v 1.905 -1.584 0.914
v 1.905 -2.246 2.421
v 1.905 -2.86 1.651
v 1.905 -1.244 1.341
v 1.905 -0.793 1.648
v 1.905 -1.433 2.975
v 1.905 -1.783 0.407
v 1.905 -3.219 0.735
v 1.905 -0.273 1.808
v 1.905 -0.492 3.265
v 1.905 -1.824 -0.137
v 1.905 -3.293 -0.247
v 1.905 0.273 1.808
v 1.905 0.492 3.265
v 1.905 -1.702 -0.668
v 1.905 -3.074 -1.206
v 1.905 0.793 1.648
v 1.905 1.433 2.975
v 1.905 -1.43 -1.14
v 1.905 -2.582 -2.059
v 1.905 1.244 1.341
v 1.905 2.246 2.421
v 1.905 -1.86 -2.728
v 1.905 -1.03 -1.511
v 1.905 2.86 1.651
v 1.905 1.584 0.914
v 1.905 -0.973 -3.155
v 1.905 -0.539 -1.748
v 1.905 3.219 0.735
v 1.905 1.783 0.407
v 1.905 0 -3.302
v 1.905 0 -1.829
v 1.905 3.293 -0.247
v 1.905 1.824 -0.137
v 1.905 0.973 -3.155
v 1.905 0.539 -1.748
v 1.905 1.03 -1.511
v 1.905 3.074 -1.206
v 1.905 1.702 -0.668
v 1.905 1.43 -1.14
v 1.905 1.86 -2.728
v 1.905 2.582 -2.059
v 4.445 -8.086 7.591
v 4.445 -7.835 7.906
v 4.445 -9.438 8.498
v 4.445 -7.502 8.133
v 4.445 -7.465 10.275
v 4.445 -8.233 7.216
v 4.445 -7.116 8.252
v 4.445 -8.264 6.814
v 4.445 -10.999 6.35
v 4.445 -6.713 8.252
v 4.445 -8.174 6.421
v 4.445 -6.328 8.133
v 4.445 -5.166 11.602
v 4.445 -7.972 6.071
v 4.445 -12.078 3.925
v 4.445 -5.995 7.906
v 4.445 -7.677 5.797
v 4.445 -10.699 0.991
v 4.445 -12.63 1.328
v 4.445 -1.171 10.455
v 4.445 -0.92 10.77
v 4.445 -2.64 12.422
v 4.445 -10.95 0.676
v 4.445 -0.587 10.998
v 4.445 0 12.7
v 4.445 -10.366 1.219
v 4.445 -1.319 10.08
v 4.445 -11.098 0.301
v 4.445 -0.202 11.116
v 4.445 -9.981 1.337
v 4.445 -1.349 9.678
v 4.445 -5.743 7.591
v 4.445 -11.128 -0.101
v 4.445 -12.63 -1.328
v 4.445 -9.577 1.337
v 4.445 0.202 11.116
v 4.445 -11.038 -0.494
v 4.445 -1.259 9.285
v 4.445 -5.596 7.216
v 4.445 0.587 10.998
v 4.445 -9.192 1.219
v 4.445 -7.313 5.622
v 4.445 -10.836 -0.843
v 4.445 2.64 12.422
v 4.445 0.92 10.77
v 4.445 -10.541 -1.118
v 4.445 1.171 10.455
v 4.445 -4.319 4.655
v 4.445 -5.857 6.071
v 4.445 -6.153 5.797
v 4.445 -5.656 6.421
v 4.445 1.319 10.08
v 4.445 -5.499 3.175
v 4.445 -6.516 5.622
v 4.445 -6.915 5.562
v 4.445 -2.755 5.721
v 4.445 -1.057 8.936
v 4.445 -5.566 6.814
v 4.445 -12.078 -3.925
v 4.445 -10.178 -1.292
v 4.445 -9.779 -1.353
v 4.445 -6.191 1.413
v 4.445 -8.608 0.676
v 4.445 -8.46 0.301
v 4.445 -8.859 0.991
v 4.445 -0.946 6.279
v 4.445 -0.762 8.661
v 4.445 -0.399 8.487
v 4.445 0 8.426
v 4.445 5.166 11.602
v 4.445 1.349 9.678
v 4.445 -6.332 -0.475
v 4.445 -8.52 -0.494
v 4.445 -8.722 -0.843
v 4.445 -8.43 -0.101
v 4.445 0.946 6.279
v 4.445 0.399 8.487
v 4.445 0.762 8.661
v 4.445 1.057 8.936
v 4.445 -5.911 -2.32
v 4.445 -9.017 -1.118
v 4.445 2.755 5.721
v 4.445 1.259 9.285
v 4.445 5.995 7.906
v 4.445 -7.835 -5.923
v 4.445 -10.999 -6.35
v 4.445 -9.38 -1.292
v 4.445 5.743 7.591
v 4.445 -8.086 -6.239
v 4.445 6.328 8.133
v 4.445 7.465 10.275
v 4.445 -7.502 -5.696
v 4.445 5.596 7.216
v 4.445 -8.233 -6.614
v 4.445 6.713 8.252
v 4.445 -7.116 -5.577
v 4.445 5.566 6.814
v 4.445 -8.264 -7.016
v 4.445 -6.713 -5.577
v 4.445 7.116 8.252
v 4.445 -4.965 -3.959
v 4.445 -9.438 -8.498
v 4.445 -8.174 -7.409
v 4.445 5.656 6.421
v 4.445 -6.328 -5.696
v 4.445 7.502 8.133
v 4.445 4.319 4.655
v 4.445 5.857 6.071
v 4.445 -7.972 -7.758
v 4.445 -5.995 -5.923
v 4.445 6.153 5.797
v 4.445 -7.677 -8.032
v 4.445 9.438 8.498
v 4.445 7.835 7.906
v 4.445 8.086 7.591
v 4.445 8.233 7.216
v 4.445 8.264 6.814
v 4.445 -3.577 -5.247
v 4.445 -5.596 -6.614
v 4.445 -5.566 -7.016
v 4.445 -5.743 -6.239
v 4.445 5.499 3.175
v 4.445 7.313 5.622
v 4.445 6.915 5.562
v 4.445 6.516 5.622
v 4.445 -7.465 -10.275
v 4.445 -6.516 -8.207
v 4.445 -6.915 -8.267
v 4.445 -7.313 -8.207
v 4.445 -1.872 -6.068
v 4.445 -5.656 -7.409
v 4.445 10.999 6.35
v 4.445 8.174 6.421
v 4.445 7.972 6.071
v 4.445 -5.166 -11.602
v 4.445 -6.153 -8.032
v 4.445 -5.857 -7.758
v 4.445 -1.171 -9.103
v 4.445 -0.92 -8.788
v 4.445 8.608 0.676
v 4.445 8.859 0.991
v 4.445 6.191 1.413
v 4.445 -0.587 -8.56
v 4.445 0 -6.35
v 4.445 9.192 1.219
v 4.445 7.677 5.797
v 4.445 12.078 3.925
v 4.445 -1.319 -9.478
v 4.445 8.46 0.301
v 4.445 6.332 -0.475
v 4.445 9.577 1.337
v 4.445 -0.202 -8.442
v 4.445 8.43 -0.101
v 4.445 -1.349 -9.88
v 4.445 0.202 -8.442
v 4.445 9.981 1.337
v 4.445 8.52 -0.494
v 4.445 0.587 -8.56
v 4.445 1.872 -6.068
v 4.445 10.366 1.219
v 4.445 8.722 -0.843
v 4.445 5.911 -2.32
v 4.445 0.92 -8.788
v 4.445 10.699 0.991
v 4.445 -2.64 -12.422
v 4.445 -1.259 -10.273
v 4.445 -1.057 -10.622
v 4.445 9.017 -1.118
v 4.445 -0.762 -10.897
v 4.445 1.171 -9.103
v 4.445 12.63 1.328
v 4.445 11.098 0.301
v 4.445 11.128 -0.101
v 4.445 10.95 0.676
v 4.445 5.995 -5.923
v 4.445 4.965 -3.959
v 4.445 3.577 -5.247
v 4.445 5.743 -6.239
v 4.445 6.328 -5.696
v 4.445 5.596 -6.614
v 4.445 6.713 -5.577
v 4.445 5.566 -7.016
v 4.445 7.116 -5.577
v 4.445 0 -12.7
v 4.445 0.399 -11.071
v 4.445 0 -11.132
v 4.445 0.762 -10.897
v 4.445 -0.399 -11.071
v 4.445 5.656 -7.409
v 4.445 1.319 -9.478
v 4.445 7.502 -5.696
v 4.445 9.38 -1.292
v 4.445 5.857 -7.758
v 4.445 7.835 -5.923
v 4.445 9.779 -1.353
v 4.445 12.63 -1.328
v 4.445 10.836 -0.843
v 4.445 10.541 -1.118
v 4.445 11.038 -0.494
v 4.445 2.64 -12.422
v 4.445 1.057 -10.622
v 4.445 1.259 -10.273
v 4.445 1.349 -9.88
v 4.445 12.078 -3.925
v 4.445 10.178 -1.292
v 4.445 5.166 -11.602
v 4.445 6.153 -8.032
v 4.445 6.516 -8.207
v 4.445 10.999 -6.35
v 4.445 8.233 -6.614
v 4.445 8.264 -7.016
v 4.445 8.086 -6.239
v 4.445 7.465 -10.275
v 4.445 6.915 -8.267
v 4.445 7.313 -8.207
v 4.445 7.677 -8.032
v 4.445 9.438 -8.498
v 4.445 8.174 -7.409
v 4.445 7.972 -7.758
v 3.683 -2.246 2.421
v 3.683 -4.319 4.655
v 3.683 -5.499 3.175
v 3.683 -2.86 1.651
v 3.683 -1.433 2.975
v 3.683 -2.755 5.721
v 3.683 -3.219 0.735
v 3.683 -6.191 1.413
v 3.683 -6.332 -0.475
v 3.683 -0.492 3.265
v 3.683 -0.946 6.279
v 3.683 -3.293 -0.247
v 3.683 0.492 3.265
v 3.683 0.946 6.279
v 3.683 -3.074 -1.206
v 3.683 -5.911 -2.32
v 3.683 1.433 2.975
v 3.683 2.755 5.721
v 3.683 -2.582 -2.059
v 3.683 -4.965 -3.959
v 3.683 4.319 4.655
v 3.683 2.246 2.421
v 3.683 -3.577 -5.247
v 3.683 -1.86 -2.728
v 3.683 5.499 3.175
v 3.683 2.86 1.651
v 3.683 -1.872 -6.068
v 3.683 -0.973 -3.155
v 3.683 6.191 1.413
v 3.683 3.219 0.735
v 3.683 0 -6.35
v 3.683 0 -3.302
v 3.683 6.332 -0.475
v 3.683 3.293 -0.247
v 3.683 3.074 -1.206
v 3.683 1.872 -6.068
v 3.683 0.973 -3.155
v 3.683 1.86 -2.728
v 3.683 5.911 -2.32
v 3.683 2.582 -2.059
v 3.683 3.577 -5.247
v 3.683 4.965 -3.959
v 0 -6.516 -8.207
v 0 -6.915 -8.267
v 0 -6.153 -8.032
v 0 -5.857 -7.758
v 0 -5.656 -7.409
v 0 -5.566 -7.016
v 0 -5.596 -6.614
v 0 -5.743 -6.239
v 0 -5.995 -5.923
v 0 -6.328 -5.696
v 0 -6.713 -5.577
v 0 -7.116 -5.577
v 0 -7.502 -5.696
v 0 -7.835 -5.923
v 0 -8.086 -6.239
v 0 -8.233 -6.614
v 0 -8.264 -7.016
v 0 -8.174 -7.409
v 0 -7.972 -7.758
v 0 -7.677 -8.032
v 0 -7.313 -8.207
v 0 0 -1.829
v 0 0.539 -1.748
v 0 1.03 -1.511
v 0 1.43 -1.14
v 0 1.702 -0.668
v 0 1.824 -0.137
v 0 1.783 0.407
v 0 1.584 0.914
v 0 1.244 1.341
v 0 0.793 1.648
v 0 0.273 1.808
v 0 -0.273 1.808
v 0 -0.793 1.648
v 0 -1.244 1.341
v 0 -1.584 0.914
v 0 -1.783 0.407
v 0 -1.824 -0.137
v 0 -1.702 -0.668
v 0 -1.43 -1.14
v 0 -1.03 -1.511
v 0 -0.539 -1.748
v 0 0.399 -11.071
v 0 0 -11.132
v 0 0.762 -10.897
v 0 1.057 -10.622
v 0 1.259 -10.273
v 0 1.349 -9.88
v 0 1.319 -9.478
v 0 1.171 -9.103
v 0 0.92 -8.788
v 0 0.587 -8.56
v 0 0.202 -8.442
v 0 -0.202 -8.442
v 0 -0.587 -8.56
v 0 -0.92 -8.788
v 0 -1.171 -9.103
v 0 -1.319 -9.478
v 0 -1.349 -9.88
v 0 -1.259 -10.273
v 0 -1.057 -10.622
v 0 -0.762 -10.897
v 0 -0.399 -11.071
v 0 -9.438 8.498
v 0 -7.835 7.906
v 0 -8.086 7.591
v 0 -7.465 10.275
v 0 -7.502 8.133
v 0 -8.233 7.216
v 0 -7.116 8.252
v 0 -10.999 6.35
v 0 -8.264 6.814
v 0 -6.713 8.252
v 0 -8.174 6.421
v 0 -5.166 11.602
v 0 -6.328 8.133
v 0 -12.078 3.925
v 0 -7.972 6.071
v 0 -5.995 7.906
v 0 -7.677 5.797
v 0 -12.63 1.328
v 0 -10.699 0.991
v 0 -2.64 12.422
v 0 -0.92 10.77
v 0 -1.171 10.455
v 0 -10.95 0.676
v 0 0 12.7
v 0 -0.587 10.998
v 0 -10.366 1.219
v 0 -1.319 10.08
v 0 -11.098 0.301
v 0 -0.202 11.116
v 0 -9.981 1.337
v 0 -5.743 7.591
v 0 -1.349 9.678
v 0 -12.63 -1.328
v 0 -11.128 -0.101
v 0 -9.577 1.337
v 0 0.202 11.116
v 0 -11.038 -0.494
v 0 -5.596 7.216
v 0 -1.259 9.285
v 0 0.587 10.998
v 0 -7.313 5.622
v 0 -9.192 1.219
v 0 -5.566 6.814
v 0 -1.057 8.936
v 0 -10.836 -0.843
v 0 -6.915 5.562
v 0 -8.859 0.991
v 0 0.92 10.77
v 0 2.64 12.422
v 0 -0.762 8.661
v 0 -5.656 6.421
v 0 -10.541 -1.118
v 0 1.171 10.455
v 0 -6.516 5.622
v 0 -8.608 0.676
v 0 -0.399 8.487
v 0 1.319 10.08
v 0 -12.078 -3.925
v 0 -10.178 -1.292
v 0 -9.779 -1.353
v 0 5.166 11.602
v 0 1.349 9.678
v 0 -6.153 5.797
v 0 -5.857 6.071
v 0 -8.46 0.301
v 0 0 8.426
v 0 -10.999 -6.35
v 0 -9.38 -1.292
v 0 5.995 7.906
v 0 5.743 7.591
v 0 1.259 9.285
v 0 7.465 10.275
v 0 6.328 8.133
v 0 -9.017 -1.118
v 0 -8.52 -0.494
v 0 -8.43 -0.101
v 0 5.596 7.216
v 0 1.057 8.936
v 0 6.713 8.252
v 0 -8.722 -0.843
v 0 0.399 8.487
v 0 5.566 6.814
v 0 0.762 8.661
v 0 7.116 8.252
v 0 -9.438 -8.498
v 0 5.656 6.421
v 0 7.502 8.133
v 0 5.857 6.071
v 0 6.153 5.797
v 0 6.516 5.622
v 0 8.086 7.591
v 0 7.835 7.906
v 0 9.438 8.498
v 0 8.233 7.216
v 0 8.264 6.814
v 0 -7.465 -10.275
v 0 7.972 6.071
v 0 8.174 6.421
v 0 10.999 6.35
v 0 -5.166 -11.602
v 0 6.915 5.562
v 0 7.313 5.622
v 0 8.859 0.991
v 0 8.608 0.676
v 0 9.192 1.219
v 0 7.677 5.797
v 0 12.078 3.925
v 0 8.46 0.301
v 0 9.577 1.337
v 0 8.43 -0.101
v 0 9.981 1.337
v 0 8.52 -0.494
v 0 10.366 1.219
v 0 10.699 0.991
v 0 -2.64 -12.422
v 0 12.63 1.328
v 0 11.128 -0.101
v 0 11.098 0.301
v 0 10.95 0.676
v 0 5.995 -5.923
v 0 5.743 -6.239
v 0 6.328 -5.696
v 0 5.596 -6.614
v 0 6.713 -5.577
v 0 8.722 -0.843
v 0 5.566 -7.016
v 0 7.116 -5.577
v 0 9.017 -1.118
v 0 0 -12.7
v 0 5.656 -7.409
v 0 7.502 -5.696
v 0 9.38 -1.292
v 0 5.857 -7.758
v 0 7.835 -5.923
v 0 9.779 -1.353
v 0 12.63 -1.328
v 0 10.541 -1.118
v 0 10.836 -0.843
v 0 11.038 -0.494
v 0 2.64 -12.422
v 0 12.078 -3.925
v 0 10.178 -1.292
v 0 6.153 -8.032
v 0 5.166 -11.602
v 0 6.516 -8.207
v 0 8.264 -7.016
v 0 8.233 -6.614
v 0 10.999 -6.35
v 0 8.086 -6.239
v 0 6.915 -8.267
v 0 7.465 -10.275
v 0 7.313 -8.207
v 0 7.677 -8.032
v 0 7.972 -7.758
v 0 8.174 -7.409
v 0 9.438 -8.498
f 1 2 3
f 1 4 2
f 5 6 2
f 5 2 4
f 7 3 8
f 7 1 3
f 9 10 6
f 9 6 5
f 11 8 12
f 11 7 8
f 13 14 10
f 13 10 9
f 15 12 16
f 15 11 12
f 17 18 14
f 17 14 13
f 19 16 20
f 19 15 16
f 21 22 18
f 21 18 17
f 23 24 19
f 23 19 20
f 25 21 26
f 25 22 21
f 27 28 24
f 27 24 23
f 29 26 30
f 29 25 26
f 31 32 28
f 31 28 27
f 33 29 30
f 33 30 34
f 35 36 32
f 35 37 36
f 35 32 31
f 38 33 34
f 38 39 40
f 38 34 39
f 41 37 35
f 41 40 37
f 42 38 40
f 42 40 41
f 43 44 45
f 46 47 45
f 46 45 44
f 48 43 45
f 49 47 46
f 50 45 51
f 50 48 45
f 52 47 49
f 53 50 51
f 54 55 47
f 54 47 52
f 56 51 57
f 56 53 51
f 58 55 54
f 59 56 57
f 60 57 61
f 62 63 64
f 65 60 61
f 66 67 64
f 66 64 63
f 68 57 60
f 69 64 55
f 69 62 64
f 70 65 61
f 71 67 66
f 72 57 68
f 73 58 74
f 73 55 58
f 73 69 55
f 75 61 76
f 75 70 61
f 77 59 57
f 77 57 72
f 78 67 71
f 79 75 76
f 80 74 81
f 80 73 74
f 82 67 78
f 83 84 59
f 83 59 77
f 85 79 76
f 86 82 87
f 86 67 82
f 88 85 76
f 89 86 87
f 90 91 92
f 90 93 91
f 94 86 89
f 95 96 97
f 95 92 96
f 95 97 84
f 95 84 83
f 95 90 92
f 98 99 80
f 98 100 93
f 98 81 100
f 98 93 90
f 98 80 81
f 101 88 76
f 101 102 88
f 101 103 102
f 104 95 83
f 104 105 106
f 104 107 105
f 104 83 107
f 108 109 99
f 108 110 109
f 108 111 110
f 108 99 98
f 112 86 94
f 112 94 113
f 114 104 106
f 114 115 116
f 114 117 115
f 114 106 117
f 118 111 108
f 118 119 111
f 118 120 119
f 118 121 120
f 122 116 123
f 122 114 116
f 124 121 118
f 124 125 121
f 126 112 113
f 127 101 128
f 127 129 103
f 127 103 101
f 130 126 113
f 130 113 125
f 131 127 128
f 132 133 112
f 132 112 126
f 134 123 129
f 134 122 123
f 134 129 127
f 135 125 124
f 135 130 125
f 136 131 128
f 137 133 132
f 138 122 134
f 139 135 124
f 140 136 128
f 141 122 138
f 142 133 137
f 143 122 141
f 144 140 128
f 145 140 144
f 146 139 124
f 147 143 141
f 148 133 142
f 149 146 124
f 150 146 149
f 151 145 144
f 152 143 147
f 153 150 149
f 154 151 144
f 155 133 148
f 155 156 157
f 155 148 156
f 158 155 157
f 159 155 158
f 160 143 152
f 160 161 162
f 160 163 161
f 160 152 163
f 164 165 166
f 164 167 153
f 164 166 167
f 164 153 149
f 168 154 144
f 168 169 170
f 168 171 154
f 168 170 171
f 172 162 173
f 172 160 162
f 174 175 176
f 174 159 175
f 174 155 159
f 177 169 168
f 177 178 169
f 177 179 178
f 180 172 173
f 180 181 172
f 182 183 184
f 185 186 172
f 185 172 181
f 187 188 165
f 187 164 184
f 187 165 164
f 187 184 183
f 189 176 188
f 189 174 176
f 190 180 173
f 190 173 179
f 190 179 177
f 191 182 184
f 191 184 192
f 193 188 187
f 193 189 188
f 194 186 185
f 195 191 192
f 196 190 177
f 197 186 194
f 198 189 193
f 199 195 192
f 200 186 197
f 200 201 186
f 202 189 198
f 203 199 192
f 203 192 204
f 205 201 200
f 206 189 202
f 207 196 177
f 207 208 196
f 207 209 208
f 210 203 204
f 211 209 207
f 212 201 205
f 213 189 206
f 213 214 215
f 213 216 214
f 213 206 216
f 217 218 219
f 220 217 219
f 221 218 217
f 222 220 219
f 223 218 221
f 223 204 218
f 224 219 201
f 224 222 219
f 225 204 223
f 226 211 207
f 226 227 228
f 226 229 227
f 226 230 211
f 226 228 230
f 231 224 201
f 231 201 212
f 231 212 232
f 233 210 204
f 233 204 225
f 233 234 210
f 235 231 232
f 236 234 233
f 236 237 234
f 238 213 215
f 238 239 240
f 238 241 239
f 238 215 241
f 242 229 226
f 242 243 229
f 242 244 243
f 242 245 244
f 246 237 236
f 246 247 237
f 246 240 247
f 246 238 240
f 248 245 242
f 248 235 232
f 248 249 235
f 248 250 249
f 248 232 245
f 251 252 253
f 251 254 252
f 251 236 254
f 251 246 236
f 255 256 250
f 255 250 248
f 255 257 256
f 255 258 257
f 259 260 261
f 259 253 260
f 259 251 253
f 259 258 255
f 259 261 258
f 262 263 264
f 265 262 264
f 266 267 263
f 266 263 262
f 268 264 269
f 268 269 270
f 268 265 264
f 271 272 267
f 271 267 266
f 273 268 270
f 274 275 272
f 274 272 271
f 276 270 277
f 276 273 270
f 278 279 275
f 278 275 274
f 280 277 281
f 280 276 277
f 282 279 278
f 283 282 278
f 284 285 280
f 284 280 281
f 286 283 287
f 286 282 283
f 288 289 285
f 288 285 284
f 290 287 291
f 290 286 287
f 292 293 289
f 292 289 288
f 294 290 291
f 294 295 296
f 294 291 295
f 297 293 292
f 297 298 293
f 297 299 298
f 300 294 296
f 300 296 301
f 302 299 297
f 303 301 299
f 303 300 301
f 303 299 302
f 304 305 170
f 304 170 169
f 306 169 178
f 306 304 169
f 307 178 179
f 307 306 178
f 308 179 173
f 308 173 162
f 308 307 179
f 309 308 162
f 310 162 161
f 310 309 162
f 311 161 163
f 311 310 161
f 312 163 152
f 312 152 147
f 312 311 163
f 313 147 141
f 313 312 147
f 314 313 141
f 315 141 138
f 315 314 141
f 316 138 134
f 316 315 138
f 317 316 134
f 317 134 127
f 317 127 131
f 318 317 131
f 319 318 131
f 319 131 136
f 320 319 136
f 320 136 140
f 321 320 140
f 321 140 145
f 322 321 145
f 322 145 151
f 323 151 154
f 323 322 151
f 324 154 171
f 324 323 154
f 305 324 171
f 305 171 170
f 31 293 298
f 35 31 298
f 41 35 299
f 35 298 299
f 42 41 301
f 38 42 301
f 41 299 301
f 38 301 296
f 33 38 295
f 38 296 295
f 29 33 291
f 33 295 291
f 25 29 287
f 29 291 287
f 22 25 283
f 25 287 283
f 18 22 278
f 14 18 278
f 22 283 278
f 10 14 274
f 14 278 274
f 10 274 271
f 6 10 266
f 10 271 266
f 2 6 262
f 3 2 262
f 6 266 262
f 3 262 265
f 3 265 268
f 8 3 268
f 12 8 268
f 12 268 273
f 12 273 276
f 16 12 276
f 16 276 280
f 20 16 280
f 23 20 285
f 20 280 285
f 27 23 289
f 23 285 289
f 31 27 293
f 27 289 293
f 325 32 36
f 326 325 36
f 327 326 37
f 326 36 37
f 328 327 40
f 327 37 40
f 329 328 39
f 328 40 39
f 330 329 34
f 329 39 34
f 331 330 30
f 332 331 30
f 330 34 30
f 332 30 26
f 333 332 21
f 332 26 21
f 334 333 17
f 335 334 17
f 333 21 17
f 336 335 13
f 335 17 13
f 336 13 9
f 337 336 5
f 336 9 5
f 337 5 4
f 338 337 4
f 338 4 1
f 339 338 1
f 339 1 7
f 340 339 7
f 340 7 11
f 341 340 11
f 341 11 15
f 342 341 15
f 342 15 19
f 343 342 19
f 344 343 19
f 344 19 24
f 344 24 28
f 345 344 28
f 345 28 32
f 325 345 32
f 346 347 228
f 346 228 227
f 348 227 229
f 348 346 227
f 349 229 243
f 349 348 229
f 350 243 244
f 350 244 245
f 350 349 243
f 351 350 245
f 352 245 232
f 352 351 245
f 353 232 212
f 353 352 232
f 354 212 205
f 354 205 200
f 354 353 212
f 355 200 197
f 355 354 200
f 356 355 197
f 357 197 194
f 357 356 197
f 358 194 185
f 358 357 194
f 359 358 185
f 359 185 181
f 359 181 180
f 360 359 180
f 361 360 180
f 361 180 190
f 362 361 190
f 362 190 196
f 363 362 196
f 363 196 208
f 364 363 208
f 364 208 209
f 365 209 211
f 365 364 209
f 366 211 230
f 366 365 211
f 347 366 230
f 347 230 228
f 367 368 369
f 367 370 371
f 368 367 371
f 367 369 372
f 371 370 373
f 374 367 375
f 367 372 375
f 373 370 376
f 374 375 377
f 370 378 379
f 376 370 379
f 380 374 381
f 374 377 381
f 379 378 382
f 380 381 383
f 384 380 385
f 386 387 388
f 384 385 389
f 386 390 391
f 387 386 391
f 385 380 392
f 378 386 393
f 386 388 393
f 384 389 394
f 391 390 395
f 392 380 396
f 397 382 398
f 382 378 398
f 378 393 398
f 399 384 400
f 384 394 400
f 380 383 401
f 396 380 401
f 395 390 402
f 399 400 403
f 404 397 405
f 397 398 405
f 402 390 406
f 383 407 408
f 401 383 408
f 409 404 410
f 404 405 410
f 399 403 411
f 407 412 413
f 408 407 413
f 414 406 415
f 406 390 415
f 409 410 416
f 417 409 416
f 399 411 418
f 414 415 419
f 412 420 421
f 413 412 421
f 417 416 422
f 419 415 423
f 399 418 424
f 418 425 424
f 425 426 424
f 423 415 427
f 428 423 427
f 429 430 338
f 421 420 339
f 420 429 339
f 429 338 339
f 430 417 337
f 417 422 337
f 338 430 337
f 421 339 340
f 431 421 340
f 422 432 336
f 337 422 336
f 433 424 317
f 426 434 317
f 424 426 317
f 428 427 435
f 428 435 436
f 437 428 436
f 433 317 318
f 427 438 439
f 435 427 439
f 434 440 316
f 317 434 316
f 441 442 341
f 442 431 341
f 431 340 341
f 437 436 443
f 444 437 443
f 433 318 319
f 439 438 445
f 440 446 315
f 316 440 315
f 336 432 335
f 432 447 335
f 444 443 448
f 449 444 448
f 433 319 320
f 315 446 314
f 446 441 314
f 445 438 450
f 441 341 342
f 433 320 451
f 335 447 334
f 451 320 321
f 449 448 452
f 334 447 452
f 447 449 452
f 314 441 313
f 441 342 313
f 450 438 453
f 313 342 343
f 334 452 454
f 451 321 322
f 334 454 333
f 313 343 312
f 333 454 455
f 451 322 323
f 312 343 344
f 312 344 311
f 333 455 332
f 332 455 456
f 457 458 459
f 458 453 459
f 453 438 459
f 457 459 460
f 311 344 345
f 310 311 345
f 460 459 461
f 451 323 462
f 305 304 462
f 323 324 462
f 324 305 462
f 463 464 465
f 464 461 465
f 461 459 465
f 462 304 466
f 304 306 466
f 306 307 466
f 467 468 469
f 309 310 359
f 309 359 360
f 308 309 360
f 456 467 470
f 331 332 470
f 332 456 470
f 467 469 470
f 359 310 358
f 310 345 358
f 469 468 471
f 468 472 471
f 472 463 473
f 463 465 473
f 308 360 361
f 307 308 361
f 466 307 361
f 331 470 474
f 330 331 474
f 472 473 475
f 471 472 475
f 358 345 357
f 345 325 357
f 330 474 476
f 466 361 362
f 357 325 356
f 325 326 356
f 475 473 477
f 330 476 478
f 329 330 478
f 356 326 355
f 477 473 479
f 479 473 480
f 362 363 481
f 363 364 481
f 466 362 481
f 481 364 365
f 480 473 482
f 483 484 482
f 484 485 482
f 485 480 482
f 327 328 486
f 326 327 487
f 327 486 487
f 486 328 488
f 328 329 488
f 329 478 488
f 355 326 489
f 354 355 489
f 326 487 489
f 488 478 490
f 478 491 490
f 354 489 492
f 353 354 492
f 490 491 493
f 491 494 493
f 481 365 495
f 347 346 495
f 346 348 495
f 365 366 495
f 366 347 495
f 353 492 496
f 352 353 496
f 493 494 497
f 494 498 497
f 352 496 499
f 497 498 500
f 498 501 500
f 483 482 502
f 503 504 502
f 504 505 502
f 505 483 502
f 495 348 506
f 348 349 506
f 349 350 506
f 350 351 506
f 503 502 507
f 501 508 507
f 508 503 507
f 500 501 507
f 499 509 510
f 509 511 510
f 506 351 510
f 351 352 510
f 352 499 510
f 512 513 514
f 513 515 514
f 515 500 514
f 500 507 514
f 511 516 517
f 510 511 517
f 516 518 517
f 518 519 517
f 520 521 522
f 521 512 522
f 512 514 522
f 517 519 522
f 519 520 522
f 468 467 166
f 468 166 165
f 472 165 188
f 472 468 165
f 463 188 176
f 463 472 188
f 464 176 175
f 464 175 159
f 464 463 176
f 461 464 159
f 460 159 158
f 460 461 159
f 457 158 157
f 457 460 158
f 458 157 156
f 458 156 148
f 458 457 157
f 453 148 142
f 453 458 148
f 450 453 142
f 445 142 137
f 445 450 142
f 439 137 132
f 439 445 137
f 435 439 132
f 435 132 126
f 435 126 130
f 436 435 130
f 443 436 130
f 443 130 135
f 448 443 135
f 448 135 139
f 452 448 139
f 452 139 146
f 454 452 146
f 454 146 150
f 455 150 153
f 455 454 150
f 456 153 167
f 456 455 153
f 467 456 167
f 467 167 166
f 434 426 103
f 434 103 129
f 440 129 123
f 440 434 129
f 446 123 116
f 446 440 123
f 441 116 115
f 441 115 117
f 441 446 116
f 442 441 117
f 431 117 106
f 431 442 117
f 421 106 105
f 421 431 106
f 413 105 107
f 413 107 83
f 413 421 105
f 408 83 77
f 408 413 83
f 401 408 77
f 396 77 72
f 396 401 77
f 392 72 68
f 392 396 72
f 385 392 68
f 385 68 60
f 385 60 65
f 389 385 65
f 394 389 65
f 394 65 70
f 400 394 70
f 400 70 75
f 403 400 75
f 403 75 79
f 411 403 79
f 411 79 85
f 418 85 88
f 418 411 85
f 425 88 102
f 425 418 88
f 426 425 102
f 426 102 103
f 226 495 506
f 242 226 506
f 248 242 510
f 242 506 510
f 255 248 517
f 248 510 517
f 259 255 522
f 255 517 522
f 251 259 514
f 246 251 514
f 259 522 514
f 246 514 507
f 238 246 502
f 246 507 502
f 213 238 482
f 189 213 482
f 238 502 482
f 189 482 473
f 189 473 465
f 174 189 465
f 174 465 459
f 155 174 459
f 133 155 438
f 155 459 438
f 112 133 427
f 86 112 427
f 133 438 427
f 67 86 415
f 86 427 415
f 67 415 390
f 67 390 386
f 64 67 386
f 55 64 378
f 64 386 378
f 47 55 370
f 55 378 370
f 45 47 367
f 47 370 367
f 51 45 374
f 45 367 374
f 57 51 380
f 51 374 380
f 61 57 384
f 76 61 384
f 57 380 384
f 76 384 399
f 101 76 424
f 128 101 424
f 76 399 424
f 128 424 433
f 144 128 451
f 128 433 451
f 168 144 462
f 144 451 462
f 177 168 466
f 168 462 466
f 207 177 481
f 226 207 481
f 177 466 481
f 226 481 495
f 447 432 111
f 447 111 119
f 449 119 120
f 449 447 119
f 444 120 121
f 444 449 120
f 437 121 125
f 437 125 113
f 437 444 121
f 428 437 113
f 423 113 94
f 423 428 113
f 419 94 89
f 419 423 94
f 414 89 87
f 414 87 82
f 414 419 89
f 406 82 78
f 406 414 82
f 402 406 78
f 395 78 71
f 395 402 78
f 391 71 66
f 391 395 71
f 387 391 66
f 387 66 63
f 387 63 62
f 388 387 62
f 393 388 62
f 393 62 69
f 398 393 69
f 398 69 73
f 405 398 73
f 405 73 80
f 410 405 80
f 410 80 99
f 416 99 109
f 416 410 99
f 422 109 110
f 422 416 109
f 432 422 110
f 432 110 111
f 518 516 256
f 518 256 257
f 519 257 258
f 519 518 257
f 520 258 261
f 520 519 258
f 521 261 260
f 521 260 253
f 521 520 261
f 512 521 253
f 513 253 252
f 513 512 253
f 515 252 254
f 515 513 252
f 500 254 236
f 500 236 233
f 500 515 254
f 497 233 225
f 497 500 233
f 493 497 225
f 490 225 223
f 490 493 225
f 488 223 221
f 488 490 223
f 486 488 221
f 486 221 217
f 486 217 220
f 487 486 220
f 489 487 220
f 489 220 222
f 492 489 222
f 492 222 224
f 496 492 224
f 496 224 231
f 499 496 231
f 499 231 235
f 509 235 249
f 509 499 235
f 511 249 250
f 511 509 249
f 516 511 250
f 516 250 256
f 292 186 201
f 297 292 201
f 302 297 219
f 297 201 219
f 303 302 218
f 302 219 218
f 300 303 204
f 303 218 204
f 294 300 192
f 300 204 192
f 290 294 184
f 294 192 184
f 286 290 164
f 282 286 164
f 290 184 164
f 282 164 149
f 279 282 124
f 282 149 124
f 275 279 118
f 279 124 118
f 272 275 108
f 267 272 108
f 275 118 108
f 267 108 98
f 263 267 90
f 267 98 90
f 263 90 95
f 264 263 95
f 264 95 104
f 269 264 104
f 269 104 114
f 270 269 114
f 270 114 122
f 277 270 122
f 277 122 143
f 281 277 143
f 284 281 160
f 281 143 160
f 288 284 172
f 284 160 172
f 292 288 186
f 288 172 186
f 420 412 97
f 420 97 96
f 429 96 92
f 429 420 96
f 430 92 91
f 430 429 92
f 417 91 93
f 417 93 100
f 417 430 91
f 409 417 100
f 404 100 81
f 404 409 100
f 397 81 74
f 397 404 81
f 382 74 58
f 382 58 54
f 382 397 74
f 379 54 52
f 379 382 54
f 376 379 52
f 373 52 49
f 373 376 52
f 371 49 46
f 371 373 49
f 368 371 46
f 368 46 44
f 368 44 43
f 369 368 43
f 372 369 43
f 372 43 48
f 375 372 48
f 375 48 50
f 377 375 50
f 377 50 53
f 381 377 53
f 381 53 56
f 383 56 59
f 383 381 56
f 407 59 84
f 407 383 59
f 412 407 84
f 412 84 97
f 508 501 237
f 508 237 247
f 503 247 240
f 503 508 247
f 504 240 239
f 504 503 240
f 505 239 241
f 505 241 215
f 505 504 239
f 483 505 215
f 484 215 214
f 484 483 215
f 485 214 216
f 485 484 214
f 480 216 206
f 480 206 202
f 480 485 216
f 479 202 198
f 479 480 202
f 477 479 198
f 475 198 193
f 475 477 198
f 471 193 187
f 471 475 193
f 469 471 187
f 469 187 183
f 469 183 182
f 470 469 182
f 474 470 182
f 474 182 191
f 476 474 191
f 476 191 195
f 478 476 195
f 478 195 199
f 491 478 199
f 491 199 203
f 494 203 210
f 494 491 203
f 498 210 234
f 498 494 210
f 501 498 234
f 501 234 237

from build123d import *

# Parameters (mm, degrees)
SKETCH1_R           = 12.7
SKETCH1_R_2         = 1.35255
BOSS_EXTRUDE1_DEPTH = 4.445
SKETCH2_R           = 6.35
CUT_EXTRUDE1_DEPTH  = 0.762
SKETCH3_R           = 3.302
CUT_EXTRUDE2_DEPTH  = 1.778
SKETCH4_R           = 1.8288
CUT_EXTRUDE3_DEPTH  = 2.905


with BuildPart() as part:
    # Sketch1 → Boss-Extrude1 (new body)
    with BuildSketch(Plane(origin=(0, 0, 0), x_dir=(0, 0, -1), z_dir=(1, 0, 0))):
        Circle(SKETCH1_R)
        with Locations((0, 9.779)):
            Circle(SKETCH1_R_2, mode=Mode.SUBTRACT)
        with Locations((6.914797213, 6.914797213)):
            Circle(SKETCH1_R_2, mode=Mode.SUBTRACT)
        with Locations((9.779, 0)):
            Circle(SKETCH1_R_2, mode=Mode.SUBTRACT)
        with Locations((6.914797213, -6.914797213)):
            Circle(SKETCH1_R_2, mode=Mode.SUBTRACT)
        with Locations((0, -9.779)):
            Circle(SKETCH1_R_2, mode=Mode.SUBTRACT)
        with Locations((-6.914797213, -6.914797213)):
            Circle(SKETCH1_R_2, mode=Mode.SUBTRACT)
        with Locations((-9.779, 0)):
            Circle(SKETCH1_R_2, mode=Mode.SUBTRACT)
        with Locations((-6.914797213, 6.914797213)):
            Circle(SKETCH1_R_2, mode=Mode.SUBTRACT)
    extrude(amount=BOSS_EXTRUDE1_DEPTH)

    # Sketch2 → Cut-Extrude1 (cut)
    with BuildSketch(Plane(origin=(4.445, 0, 0), x_dir=(0, 0, -1), z_dir=(1, 0, 0))):
        Circle(SKETCH2_R)
    extrude(amount=-CUT_EXTRUDE1_DEPTH, mode=Mode.SUBTRACT)

    # Sketch3 → Cut-Extrude2 (cut)
    with BuildSketch(Plane(origin=(3.683, 0, 0), x_dir=(0, 0, -1), z_dir=(1, 0, 0))):
        Circle(SKETCH3_R)
    extrude(amount=-CUT_EXTRUDE2_DEPTH, mode=Mode.SUBTRACT)

    # Sketch4 → Cut-Extrude3 (cut, through all)
    with BuildSketch(Plane(origin=(1.905, 0, 0), x_dir=(0, 0, -1), z_dir=(1, 0, 0))):
        Circle(SKETCH4_R)
    extrude(amount=-CUT_EXTRUDE3_DEPTH, mode=Mode.SUBTRACT)


solid = part.part
